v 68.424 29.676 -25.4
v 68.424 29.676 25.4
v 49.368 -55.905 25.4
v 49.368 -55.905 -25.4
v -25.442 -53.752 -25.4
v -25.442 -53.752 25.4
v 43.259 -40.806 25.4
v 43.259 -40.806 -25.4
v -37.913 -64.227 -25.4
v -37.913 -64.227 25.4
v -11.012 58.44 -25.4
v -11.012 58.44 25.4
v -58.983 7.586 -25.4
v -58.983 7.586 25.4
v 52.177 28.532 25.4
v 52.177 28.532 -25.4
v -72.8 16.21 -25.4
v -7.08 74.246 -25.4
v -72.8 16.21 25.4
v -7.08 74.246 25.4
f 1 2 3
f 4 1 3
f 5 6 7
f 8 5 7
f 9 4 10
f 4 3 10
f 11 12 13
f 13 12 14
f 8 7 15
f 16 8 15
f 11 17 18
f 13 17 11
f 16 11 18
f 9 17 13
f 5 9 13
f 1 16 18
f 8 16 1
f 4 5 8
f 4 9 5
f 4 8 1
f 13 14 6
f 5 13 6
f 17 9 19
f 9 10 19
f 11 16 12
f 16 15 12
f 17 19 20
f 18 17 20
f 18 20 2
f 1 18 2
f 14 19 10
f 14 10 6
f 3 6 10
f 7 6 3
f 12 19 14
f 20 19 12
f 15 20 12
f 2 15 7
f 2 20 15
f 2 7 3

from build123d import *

# Parameters (mm, degrees)
F1_DEPTH = 25.4
F2_DEPTH = 25.4
F4_DEPTH = 25.4
F5_DEPTH = 25.4


with BuildPart() as f1:
    # F0 (on Top) → F1 (new body)
    with BuildSketch(Plane.XY):
        Polygon((68.424131, 29.676452), (-7.079764, 74.245743), (-72.799666, 16.209941), (-37.912904, -64.227449), (49.368203, -55.904687), align=None)
    extrude(amount=F1_DEPTH)

    # F1_face (on face) → F2 (join)
    with BuildSketch(Plane(origin=(0, 0, 0), x_dir=(1, 0, 0), z_dir=(0, 0, -1))):
        Polygon((68.424131, -29.676452), (49.368203, 55.904687), (-37.912904, 64.227449), (-72.799666, -16.209941), (-7.079764, -74.245743), align=None)
    extrude(amount=F2_DEPTH)

    # F3 (on face) → F4 (cut)
    with BuildSketch(Plane.XY.offset(25.4)):
        Polygon((52.176996, 28.531717), (-11.011697, 58.440058), (-58.982599, 7.586225), (-25.441554, -53.751513), (43.258854, -40.806487), align=None)
    extrude(amount=-F4_DEPTH, mode=Mode.SUBTRACT)

    # F4_face (on face) → F5 (cut)
    with BuildSketch(Plane.XY):
        Polygon((52.176996, 28.531717), (-11.011697, 58.440058), (-58.982599, 7.586225), (-25.441554, -53.751513), (43.258854, -40.806487), align=None)
    extrude(amount=-F5_DEPTH, mode=Mode.SUBTRACT)


solid = f1.part
